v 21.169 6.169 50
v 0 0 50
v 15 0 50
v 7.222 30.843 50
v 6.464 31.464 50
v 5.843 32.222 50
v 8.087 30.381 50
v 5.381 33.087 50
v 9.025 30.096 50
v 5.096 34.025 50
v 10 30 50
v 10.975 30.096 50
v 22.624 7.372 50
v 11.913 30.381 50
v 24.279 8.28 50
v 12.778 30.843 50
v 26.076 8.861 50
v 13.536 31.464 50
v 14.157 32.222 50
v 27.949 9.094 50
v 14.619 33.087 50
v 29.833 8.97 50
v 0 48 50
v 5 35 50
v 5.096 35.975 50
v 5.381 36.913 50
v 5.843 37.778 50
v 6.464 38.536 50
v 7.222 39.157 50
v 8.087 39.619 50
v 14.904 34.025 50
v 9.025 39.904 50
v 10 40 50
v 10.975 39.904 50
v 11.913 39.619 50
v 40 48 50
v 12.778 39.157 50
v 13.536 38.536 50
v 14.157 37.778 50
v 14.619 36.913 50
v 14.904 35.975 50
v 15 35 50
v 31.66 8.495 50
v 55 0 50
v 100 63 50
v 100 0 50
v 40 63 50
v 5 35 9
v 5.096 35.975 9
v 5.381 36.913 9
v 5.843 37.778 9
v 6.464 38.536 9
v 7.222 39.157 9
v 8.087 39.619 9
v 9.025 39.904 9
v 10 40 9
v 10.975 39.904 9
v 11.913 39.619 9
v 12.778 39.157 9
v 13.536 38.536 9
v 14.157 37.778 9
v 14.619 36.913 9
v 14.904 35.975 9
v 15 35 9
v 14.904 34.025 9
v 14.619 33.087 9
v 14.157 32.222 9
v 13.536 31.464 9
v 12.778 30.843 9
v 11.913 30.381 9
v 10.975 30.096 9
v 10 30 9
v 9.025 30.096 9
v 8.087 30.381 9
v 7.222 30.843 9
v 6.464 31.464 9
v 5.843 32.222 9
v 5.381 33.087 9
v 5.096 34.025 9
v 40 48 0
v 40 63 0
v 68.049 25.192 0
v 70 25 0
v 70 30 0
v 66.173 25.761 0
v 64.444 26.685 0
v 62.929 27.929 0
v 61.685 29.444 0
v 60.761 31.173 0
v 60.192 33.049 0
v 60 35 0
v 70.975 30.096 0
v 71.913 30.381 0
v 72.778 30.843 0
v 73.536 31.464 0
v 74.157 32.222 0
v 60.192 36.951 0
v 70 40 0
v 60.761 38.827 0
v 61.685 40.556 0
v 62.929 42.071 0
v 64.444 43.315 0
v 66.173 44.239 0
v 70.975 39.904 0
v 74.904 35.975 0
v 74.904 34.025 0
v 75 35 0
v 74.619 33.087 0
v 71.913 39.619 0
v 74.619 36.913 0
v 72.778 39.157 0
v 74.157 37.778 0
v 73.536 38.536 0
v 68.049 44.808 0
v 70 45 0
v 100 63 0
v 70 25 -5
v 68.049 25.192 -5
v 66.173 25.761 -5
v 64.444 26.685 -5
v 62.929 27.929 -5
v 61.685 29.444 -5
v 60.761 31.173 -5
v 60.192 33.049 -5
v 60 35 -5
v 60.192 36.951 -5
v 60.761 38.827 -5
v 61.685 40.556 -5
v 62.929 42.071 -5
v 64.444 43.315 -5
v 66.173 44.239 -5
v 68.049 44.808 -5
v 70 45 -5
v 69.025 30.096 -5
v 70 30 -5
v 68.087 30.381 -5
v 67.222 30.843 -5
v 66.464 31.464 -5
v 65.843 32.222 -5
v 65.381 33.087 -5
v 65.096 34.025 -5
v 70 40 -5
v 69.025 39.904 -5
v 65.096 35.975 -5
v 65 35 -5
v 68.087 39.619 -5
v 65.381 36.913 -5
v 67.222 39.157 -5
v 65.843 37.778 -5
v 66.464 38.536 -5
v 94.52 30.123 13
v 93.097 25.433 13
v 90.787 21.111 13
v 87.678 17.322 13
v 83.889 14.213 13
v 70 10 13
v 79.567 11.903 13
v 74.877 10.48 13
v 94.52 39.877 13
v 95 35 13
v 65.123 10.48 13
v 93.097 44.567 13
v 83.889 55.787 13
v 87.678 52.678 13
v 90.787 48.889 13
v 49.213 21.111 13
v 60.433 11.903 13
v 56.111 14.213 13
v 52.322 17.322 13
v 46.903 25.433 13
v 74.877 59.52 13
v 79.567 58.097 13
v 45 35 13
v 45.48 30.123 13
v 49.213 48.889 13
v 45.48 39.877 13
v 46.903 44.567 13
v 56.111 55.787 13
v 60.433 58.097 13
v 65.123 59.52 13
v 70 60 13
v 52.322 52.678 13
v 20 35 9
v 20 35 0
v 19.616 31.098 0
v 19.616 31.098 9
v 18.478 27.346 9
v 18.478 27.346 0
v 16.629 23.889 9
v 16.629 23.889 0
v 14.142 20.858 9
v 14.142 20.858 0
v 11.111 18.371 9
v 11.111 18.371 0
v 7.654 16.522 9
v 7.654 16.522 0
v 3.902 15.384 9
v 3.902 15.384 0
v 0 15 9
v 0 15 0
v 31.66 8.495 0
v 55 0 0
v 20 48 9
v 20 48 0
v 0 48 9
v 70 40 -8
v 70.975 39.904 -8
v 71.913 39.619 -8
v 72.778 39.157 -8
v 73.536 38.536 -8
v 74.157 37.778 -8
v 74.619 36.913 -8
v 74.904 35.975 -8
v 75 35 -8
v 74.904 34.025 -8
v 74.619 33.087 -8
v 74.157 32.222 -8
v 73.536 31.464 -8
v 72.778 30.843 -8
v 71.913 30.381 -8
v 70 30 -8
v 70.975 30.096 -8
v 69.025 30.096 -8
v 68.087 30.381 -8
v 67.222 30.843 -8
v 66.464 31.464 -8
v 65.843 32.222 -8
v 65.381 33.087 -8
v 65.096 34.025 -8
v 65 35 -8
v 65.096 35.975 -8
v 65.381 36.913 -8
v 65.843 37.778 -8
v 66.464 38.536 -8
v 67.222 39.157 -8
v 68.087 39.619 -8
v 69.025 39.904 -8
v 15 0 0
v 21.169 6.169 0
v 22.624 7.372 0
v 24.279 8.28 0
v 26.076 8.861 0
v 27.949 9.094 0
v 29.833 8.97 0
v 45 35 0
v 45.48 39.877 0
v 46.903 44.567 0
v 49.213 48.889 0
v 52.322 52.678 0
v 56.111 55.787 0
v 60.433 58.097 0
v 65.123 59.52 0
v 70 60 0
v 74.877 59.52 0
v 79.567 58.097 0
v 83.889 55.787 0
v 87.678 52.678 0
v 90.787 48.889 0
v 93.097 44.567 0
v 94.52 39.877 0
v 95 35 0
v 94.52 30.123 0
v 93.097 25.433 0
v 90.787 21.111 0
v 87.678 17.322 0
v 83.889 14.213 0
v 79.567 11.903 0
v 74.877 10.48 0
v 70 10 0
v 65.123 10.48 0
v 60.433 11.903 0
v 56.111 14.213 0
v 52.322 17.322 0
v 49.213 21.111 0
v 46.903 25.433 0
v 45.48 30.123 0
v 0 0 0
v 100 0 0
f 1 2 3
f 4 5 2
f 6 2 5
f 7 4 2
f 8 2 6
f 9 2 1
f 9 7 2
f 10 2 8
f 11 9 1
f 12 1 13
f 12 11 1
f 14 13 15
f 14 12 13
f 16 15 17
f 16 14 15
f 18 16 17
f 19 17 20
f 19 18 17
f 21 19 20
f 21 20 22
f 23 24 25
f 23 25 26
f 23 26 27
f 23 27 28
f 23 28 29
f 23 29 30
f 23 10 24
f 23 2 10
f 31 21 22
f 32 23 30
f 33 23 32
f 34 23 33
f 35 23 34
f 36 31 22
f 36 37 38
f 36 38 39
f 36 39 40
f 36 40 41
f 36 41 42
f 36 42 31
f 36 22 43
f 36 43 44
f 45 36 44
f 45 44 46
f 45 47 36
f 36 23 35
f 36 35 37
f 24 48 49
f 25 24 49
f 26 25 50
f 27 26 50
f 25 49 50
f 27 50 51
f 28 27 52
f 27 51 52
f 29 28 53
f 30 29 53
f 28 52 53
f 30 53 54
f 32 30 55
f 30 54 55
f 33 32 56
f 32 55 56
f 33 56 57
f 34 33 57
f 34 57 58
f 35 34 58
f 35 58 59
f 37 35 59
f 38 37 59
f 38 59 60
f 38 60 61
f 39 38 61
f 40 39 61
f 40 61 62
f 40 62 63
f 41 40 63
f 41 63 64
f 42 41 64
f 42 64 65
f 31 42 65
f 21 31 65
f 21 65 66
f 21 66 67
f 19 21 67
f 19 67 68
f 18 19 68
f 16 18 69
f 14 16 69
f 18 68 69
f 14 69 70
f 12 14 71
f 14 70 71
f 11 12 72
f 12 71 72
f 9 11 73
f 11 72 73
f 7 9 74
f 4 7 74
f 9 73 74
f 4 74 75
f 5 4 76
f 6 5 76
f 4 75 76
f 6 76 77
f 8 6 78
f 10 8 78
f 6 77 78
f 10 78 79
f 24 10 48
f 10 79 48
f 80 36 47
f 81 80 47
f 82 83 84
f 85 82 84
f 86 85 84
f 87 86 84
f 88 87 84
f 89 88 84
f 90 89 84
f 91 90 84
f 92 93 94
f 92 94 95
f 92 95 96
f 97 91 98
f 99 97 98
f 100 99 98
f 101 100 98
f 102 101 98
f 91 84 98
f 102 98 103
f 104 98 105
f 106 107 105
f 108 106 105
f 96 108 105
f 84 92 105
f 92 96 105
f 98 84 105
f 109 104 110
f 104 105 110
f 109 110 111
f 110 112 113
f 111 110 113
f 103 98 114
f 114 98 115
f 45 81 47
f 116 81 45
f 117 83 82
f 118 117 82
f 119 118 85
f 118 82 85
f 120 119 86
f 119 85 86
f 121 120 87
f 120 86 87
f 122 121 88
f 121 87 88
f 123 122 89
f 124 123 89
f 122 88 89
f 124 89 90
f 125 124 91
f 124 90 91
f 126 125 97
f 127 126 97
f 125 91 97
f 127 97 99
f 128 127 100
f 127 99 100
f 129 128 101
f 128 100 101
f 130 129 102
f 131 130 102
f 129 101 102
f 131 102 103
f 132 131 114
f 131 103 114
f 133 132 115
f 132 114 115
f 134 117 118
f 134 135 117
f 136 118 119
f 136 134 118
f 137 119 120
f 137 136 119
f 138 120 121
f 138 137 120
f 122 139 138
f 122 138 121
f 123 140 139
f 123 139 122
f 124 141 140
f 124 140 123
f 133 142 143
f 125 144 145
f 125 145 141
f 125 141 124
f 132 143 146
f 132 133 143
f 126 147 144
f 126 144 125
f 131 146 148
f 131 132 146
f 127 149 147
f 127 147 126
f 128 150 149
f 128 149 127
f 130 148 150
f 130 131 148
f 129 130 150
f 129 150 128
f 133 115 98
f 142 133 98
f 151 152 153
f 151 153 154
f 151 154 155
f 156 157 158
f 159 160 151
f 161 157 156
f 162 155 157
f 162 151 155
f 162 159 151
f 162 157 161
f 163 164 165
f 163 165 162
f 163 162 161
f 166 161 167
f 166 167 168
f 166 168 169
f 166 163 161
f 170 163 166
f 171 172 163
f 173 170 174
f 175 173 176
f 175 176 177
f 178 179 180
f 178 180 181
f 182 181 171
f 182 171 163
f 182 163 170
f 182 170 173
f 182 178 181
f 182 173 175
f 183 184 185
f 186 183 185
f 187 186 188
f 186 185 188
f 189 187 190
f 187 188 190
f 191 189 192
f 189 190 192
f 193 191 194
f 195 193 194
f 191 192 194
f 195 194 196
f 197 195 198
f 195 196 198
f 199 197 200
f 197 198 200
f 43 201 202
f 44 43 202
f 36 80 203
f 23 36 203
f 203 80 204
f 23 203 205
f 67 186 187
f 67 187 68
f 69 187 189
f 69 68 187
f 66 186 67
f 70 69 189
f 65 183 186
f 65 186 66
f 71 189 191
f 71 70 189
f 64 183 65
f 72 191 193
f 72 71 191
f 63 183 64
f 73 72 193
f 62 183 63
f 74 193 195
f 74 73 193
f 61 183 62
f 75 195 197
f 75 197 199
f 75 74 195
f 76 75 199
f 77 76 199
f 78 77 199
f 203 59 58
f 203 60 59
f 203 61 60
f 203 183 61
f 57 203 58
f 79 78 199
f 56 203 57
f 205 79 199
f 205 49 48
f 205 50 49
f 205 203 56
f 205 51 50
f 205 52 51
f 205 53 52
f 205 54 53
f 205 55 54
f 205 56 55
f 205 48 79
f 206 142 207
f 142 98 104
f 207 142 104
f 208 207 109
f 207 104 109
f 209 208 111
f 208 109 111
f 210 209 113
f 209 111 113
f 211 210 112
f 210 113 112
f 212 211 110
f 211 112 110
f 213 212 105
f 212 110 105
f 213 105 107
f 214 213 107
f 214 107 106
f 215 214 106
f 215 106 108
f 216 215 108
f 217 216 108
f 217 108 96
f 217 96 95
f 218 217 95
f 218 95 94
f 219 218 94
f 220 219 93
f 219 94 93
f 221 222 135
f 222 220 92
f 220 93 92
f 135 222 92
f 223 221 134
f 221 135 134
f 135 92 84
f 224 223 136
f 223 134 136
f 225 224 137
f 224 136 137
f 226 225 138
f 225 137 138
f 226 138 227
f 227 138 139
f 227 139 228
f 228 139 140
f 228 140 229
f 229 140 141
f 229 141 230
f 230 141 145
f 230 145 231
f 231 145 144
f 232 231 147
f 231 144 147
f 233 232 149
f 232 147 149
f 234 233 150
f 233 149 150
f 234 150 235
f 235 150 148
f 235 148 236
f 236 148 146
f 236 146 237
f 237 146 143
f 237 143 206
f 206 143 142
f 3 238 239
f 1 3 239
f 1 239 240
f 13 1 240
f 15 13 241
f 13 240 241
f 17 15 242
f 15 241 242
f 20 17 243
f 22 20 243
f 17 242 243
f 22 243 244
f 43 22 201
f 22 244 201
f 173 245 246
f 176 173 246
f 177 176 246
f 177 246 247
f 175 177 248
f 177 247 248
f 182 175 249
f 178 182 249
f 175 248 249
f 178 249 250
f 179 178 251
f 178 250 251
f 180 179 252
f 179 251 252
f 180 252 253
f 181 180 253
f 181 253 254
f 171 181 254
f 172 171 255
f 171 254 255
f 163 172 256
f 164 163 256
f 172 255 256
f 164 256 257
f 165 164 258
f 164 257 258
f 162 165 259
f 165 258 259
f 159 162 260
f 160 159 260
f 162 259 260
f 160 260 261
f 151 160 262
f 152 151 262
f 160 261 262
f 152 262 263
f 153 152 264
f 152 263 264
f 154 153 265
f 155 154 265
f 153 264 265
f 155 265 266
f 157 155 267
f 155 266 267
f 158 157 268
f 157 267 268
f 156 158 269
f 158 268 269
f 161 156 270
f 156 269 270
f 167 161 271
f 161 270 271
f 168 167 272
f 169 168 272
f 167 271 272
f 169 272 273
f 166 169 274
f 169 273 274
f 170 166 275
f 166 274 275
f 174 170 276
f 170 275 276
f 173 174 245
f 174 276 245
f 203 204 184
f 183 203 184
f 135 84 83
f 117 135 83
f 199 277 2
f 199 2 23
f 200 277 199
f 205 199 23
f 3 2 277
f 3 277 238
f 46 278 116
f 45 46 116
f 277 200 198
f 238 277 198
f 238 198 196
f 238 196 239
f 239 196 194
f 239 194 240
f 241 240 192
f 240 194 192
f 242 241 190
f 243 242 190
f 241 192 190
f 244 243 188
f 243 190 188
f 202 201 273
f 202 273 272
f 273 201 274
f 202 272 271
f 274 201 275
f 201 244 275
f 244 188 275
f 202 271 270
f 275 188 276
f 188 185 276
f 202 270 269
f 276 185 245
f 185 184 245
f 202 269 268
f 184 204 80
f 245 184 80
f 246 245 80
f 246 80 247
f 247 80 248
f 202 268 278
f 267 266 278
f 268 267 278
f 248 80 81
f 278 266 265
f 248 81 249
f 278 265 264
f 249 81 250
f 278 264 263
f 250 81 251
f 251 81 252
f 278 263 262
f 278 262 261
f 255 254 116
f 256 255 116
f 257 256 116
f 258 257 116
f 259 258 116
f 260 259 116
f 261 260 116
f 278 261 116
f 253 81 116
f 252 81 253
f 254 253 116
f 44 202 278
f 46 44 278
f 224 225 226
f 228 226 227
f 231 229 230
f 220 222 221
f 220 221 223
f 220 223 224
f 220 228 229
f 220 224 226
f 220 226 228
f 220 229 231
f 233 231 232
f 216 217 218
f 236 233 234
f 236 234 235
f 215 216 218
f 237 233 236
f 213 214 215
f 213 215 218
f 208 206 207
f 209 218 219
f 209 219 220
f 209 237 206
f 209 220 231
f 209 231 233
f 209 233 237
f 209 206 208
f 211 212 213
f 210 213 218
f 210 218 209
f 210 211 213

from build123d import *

# Parameters (mm, degrees)
SKETCH_1_W          = 100
SKETCH_1_H          = 63
EXTRUDE_1_DEPTH     = 50
SKETCH_2_W          = 40
SKETCH_2_H          = 15
CUT_EXTRUDE_2_DEPTH = 129.33160172
CUT_EXTRUDE_3_DEPTH = 9
SKETCH_3_3_R        = 5
CUT_EXTRUDE_4_DEPTH = 129.33160172
CUT_EXTRUDE_5_DEPTH = 129.33160172
SKETCH_7_R          = 25
CUT_EXTRUDE_6_DEPTH = 13
EXTRUDE_2_DEPTH     = 5
EXTRUDE_3_DEPTH     = 8


with BuildPart() as part:
    # 草圖1 → 填料-伸長1 (new body)
    with BuildSketch(Plane.XY):
        with Locations((50, 31.5)):
            Rectangle(SKETCH_1_W, SKETCH_1_H)
    extrude(amount=EXTRUDE_1_DEPTH)

    # 草圖2 → 除料-伸長2 (cut, through all)
    with BuildSketch(Plane(origin=(0, 0, 0), x_dir=(-1, 0, 0), z_dir=(0, 0, -1))):
        with Locations((-20, 55.5)):
            Rectangle(SKETCH_2_W, SKETCH_2_H)
    extrude(amount=-CUT_EXTRUDE_2_DEPTH, mode=Mode.SUBTRACT)

    # 草圖3 → 除料-伸長3 (cut)
    with BuildSketch(Plane(origin=(0, 0, 0), x_dir=(-1, 0, 0), z_dir=(0, 0, -1))):
        with BuildLine():
            Line((-20, 48), (-20, 35))
            ThreePointArc((-20, 35), (-14.142135624, 20.857864376), (0, 15))
            Line((0, 15), (0, 48))
            Line((0, 48), (-20, 48))
        make_face()
    extrude(amount=-CUT_EXTRUDE_3_DEPTH, mode=Mode.SUBTRACT)

    # 草圖3<3> → 除料-伸長4 (cut, through all)
    with BuildSketch(Plane(origin=(0, 0, 0), x_dir=(-1, 0, 0), z_dir=(0, 0, -1))):
        with Locations((-10, 35)):
            Circle(SKETCH_3_3_R)
    extrude(amount=-CUT_EXTRUDE_4_DEPTH, mode=Mode.SUBTRACT)

    # 草圖6 → 除料-伸長5 (cut, through all)
    with BuildSketch(Plane(origin=(0, 0, 0), x_dir=(-1, 0, 0), z_dir=(0, 0, -1))):
        with BuildLine():
            Line((-15, 0), (-21.169079822, 6.169079822))
            ThreePointArc((-21.169079822, 6.169079822), (-26.075751494, 8.860972081), (-31.660349067, 8.494938218))
            Line((-31.660349067, 8.494938218), (-55, 0))
            Line((-55, 0), (-15, 0))
        make_face()
    extrude(amount=-CUT_EXTRUDE_5_DEPTH, mode=Mode.SUBTRACT)

    # 草圖7 → 除料-伸長6 (cut)
    with BuildSketch(Plane(origin=(0, 0, 0), x_dir=(-1, 0, 0), z_dir=(0, 0, -1))):
        with Locations((-70, 35)):
            Circle(SKETCH_7_R)
    extrude(amount=-CUT_EXTRUDE_6_DEPTH, mode=Mode.SUBTRACT)


with BuildPart() as body_2:
    # 草圖7<3> → 填料-伸長2 (new body)
    with BuildSketch(Plane(origin=(0, 0, 0), x_dir=(-1, 0, 0), z_dir=(0, 0, -1))):
        with BuildLine():
            ThreePointArc((-70, 25), (-60, 35), (-70, 45))
            Line((-70, 45), (-70, 40))
            ThreePointArc((-70, 40), (-66.464466094, 38.535533906), (-65, 35))
            ThreePointArc((-65, 35), (-66.464466094, 31.464466094), (-70, 30))
            Line((-70, 30), (-70, 25))
        make_face()
    extrude(amount=EXTRUDE_2_DEPTH)

    # 草圖7<4> → 填料-伸長3 (add)
    with BuildSketch(Plane(origin=(0, 0, 0), x_dir=(-1, 0, 0), z_dir=(0, 0, -1))):
        with BuildLine():
            ThreePointArc((-65, 35), (-66.464466094, 38.535533906), (-70, 40))
            ThreePointArc((-70, 40), (-75, 35), (-70, 30))
            ThreePointArc((-70, 30), (-66.464466094, 31.464466094), (-65, 35))
        make_face()
    extrude(amount=EXTRUDE_3_DEPTH)


solid = Compound([part.part, body_2.part])
